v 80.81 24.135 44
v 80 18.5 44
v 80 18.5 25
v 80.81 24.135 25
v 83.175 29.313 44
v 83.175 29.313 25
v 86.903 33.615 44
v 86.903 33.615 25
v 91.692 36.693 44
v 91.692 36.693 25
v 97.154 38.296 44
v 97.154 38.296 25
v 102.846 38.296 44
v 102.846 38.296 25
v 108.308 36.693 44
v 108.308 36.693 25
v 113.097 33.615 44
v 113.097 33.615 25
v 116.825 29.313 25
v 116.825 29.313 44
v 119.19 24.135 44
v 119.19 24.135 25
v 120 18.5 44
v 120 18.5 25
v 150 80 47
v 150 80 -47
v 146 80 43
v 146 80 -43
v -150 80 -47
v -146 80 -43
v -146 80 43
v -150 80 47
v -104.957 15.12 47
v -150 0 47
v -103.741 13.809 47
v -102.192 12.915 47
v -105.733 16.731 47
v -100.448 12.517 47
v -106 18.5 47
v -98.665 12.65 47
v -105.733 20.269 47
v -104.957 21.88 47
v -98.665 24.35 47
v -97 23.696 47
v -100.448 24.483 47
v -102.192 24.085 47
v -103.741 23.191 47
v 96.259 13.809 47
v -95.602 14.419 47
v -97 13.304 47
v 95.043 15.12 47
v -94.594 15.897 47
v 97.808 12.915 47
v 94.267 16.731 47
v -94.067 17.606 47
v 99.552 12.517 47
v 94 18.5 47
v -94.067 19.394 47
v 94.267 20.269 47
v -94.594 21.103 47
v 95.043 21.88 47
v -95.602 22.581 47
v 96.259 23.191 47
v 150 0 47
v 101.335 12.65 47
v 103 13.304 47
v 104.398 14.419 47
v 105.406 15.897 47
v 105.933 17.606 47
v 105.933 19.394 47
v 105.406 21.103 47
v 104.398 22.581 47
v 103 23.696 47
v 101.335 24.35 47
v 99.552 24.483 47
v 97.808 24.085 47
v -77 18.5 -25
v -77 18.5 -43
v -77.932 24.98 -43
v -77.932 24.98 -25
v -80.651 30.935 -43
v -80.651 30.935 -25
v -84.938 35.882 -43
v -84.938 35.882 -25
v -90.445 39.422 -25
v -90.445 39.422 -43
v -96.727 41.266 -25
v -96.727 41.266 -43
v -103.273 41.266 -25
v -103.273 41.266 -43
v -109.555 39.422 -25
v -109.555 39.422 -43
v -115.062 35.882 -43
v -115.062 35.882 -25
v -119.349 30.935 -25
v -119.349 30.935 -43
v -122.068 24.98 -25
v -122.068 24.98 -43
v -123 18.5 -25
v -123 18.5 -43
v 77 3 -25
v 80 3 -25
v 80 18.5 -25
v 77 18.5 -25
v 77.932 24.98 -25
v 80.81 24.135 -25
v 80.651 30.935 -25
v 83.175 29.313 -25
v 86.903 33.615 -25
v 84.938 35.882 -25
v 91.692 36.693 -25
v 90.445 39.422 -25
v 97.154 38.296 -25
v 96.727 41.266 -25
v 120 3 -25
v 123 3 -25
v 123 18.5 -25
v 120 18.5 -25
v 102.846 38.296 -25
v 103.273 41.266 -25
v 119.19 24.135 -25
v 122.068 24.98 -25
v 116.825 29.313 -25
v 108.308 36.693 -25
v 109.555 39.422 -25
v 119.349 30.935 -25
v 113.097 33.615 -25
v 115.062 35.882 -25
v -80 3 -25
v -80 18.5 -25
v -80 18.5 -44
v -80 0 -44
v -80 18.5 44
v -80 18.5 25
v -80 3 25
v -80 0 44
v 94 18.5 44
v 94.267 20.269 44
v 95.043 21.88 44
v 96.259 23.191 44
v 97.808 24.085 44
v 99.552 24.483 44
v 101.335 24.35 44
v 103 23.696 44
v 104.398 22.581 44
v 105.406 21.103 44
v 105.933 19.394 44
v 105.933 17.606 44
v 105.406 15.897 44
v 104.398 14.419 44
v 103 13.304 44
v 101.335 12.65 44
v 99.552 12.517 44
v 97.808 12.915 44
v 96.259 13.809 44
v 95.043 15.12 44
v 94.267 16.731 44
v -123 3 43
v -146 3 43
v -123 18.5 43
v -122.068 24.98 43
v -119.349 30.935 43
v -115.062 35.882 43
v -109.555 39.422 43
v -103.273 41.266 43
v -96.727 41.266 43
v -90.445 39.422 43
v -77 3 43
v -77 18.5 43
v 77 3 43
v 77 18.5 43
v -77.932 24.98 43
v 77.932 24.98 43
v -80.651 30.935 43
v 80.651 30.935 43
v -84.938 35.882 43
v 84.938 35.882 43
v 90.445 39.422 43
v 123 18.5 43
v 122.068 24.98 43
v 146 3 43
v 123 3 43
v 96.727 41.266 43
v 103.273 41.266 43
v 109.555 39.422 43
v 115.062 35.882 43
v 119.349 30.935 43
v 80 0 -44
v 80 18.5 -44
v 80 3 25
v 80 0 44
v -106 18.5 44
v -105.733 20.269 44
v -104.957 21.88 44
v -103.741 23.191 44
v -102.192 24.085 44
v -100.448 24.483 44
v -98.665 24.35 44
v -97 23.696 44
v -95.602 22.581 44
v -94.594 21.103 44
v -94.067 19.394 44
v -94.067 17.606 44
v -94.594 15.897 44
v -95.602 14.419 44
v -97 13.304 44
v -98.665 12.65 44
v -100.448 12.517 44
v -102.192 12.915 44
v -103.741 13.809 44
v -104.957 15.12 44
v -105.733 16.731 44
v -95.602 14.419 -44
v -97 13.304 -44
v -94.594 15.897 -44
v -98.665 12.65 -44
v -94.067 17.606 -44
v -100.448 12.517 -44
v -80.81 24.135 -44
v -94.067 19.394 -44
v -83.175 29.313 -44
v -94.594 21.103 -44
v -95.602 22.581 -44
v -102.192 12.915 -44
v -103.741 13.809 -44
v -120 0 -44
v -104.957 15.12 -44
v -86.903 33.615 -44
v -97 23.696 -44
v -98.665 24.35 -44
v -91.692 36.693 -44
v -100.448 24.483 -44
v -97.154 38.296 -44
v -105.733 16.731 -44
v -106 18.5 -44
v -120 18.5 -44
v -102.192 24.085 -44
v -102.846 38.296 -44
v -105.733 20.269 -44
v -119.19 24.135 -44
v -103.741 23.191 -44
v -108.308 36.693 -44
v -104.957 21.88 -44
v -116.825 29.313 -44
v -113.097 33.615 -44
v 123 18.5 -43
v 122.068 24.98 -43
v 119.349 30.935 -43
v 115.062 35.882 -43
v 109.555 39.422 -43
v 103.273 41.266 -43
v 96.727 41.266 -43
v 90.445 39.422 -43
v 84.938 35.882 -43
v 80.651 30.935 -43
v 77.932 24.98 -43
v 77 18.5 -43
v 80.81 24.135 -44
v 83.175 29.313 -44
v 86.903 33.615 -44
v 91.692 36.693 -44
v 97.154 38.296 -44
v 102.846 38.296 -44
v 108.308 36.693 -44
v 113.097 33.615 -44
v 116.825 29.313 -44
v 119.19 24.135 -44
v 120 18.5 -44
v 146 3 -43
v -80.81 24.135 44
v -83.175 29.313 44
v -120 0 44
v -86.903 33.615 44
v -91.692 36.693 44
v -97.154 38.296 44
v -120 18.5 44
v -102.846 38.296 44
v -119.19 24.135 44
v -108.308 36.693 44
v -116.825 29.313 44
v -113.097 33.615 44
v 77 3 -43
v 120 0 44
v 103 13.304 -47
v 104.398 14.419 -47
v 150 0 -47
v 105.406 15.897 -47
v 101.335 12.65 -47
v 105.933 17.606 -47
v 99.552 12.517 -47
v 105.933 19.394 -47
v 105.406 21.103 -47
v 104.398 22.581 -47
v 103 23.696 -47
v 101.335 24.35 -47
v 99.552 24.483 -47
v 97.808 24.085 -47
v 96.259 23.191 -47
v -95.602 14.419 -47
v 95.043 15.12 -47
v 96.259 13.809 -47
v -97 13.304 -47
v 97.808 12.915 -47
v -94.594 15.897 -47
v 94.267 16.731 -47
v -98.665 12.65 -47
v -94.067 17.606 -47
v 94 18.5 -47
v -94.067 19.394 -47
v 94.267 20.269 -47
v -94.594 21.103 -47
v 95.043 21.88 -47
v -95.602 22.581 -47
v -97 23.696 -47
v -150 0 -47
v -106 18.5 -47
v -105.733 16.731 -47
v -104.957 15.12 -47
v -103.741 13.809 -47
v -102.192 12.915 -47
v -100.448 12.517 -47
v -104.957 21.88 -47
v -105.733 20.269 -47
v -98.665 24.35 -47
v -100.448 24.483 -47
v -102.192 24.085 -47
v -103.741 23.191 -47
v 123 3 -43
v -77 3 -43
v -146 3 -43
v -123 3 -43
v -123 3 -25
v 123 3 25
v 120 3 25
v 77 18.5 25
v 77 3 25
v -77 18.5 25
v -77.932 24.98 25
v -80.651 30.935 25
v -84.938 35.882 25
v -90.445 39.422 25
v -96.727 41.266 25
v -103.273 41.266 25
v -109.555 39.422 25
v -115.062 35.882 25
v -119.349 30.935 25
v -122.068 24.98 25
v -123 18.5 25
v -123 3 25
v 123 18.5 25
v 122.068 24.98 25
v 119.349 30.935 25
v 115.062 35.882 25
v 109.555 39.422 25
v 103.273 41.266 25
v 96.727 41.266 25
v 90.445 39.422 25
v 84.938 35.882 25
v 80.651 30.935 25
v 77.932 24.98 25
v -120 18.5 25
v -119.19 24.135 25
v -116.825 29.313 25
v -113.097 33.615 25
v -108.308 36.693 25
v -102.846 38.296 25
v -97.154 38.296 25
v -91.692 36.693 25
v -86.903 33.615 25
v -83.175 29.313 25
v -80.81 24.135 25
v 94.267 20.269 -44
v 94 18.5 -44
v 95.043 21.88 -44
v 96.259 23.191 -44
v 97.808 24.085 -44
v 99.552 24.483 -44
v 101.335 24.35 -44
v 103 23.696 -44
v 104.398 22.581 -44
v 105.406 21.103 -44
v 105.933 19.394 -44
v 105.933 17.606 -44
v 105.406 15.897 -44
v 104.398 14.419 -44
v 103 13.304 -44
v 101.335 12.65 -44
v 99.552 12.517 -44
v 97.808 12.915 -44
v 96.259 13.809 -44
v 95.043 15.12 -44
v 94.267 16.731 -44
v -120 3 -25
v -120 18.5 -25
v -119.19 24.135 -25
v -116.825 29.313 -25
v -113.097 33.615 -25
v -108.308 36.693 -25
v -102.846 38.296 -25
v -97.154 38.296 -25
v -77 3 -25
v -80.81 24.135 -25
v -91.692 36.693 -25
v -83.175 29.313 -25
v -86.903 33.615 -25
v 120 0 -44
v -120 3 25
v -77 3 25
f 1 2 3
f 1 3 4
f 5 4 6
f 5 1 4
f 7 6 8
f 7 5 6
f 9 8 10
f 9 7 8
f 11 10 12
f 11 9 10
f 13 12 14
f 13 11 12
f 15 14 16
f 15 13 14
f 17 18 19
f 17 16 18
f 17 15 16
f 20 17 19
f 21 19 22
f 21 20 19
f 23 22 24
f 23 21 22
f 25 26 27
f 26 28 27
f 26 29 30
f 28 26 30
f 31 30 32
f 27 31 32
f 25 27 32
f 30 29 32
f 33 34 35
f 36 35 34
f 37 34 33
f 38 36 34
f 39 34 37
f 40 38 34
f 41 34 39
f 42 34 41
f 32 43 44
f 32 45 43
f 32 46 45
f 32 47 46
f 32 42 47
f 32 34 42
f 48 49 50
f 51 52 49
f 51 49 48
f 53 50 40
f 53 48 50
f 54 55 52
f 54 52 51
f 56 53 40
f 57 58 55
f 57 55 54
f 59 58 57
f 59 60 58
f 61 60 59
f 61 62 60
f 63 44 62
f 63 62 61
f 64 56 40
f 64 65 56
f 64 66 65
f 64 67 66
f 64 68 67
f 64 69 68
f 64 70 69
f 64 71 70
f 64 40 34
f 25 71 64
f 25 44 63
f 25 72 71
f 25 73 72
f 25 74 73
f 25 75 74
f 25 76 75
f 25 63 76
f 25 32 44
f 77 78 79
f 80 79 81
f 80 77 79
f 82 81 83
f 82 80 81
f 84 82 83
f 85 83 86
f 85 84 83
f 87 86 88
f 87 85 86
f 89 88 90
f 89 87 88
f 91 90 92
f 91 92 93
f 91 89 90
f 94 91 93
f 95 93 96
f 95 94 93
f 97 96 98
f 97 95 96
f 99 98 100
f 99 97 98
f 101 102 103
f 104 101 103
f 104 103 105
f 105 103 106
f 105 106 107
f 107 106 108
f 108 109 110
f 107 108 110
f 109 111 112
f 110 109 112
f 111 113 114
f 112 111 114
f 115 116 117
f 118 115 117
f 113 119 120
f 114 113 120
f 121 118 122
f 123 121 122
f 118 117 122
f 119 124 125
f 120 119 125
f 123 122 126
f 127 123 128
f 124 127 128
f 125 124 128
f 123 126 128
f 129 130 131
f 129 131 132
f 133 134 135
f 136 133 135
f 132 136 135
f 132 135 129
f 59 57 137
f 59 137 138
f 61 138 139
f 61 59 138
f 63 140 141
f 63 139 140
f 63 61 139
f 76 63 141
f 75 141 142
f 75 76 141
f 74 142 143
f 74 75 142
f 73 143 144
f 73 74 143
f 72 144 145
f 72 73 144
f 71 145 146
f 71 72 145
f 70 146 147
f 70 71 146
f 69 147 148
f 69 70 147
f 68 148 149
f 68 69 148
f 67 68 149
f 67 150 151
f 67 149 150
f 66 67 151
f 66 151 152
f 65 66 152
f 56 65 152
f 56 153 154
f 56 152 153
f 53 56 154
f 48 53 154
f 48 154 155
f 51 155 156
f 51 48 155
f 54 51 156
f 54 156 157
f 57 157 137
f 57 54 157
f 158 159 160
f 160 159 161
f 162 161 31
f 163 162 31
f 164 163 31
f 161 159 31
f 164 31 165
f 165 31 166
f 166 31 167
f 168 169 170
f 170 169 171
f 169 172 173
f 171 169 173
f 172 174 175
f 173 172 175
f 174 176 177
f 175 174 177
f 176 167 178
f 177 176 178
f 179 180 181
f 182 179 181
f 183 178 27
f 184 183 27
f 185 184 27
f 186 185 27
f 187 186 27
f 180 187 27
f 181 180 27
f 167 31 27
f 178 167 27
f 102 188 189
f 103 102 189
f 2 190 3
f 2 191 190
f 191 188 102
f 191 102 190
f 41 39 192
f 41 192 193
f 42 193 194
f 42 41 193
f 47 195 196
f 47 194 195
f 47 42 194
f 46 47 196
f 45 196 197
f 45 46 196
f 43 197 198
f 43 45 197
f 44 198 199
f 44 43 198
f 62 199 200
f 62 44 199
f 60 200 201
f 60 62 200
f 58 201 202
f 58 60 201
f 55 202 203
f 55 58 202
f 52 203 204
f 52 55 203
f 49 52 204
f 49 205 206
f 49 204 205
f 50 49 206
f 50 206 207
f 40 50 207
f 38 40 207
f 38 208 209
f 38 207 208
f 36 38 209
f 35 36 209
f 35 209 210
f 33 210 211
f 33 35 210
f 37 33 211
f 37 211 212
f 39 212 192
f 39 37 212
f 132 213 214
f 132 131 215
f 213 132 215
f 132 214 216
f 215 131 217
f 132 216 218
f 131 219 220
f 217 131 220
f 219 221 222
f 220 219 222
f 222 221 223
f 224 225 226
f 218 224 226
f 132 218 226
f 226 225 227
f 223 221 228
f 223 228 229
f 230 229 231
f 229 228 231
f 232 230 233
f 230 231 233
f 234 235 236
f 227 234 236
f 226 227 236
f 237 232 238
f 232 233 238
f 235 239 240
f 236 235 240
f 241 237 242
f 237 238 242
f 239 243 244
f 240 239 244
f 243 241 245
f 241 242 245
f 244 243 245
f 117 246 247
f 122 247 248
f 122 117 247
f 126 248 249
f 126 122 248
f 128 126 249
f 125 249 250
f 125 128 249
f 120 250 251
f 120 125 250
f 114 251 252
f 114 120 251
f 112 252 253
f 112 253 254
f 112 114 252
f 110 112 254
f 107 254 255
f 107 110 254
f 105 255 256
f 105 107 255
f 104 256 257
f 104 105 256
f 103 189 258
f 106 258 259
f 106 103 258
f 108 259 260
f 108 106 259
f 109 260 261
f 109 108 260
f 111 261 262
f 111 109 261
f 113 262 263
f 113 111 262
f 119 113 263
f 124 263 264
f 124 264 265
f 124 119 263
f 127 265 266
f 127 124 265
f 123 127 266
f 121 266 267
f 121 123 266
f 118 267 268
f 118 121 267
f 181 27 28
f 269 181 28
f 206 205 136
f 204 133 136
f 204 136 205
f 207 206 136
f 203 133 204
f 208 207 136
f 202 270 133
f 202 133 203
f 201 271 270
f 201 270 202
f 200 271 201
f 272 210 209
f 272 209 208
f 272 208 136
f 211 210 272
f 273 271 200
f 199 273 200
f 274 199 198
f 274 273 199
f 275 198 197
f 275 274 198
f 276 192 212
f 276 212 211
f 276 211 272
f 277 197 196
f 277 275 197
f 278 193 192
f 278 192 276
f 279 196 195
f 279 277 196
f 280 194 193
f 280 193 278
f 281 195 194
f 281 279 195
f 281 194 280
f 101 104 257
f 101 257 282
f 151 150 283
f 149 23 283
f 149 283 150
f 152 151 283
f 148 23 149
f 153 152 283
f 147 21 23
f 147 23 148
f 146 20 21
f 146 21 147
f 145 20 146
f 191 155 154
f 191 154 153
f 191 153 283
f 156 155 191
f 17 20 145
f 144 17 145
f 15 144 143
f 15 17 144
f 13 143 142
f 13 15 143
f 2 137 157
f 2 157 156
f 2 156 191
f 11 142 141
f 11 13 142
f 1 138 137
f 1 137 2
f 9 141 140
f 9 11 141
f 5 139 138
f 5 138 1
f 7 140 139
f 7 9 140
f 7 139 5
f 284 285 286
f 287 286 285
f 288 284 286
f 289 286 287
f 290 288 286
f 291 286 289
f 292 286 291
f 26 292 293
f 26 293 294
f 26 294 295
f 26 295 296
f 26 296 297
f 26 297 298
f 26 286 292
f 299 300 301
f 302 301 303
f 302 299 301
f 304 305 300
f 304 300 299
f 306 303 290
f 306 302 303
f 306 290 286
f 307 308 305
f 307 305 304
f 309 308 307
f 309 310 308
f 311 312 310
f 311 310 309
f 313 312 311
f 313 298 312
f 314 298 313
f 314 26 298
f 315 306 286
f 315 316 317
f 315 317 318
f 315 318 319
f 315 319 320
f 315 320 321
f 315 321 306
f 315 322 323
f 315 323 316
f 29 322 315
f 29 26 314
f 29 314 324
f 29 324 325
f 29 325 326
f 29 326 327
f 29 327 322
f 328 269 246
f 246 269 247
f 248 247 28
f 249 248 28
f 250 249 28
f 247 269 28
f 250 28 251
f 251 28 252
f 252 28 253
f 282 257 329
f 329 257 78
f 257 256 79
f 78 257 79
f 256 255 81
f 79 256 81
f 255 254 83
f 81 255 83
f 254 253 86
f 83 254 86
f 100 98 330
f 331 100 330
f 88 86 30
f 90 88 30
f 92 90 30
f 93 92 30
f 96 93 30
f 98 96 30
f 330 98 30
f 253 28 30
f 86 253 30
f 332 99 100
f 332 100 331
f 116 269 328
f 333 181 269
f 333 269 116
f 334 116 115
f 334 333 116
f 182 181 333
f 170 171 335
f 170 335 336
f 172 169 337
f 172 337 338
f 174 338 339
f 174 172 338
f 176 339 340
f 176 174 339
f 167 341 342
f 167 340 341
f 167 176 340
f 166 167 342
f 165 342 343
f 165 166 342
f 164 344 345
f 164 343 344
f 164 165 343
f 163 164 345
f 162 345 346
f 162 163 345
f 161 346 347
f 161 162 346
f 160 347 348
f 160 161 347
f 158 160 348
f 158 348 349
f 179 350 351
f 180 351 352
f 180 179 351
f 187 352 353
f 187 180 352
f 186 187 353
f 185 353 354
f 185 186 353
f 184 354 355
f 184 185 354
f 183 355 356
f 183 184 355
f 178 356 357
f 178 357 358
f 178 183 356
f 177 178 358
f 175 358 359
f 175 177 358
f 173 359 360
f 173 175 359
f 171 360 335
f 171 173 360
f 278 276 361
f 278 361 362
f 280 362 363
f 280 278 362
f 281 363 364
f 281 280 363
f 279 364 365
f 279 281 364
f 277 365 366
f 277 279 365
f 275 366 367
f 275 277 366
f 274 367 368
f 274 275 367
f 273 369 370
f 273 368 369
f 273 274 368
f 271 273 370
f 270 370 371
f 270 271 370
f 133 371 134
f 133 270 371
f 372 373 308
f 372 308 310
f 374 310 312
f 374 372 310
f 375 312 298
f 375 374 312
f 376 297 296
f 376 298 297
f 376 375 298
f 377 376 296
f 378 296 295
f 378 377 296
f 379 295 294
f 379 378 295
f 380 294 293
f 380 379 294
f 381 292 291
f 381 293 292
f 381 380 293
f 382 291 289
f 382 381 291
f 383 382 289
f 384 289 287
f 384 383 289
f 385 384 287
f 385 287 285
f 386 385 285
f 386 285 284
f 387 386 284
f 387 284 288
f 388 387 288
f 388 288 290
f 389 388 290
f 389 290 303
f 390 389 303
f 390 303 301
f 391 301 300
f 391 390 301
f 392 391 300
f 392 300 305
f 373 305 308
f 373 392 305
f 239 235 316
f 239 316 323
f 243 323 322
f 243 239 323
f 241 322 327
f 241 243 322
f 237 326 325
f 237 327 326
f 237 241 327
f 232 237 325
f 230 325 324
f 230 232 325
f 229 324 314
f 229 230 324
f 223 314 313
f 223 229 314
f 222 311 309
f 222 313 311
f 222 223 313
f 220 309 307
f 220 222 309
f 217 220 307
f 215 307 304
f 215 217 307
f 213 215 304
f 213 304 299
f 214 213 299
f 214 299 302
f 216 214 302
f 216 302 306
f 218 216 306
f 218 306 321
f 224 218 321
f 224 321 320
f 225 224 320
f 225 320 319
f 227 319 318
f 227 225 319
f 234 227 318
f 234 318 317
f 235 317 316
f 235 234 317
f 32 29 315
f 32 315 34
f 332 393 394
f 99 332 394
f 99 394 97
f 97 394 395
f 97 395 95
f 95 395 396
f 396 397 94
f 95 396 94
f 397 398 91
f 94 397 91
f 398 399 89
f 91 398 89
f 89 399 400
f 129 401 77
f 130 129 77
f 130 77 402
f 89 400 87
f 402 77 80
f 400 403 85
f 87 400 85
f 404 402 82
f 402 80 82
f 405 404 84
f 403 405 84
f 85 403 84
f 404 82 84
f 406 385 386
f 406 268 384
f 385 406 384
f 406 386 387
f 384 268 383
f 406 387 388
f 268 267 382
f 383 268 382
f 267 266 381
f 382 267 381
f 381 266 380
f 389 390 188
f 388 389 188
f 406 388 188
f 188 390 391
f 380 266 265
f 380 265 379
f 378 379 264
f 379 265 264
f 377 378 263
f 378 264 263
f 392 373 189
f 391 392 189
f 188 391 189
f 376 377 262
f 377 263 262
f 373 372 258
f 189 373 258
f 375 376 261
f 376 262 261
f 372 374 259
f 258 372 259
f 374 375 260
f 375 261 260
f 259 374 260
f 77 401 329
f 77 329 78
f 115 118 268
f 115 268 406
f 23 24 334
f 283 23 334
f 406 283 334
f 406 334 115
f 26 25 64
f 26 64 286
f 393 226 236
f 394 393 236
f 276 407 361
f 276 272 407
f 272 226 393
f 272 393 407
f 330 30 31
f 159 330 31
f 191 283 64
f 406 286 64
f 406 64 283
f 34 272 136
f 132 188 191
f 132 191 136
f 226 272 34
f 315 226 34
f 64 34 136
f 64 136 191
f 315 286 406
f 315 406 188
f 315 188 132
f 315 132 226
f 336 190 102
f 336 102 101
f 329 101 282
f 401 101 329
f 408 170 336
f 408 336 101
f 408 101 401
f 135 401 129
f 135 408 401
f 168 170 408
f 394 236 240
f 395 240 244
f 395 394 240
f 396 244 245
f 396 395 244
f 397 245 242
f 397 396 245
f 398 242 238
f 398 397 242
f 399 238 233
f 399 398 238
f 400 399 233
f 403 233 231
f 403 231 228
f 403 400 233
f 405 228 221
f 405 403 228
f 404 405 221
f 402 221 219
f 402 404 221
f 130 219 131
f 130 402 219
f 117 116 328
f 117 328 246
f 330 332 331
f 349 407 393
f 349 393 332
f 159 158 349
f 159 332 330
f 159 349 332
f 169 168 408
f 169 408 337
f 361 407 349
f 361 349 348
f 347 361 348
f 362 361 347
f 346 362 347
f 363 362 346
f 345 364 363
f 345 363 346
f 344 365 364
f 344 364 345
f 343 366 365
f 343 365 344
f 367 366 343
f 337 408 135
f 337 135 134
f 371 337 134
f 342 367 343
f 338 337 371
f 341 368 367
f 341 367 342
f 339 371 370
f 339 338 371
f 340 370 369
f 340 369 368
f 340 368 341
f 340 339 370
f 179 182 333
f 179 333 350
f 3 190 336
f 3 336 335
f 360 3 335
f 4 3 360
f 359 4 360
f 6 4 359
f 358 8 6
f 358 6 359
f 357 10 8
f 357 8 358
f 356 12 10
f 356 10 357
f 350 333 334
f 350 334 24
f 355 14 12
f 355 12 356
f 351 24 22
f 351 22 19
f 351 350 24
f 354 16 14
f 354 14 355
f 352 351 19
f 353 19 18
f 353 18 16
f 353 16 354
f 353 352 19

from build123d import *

# Parameters (mm, degrees)
SALIENTE_EXTRUIR1_DEPTH    = 47
CROQUIS2_W                 = 50
CROQUIS2_H                 = 38.5
CORTAR_EXTRUIR1_DEPTH      = 281.107568623
SALIENTE_EXTRUIR2_DEPTH    = 3
SALIENTE_EXTRUIR3_DEPTH    = 4
SALIENTE_EXTRUIR4_START    = -4
SALIENTE_EXTRUIR4_DEPTH    = 4
CROQUIS6_W                 = 86
CROQUIS6_H                 = 77
SALIENTE_EXTRUIR5_DEPTH    = 4
CROQUIS7_W                 = 86
CROQUIS7_H                 = 77
SALIENTE_EXTRUIR6_DEPTH    = 4
CORTAR_EXTRUIR2_DEPTH      = 193.353840617
CORTAR_EXTRUIR2_DEPTH_BACK = 193.353840617
CROQUIS9_R                 = 6


with BuildPart() as part:
    # Croquis1 → Saliente-Extruir1 (new, symmetric)
    with BuildSketch(Plane.XY):
        with BuildLine():
            Line((-150, 0), (-120, 0))
            Line((-120, 0), (-120, 18.5))
            ThreePointArc((-120, 18.5), (-100, 38.5), (-80, 18.5))
            Line((-80, 18.5), (-80, 0))
            Line((-80, 0), (80, 0))
            Line((80, 0), (80, 18.5))
            ThreePointArc((80, 18.5), (100, 38.5), (120, 18.5))
            Line((120, 18.5), (120, 0))
            Line((120, 0), (150, 0))
            Line((150, 0), (150, 3))
            Line((150, 3), (123, 3))
            Line((123, 3), (123, 18.5))
            ThreePointArc((123, 18.5), (100, 41.5), (77, 18.5))
            Line((77, 18.5), (77, 3))
            Line((77, 3), (-77, 3))
            Line((-77, 3), (-77, 18.5))
            ThreePointArc((-77, 18.5), (-100, 41.5), (-123, 18.5))
            Line((-123, 18.5), (-123, 3))
            Line((-123, 3), (-150, 3))
            Line((-150, 3), (-150, 0))
        make_face()
    extrude(amount=SALIENTE_EXTRUIR1_DEPTH, both=True)

    # Croquis2 → Cortar-Extruir1 (cut, through all)
    with BuildSketch(Plane(origin=(123, 0, 0), x_dir=(0, 0, -1), z_dir=(1, 0, 0))):
        with Locations((0, 22.25)):
            Rectangle(CROQUIS2_W, CROQUIS2_H)
    extrude(amount=-CORTAR_EXTRUIR1_DEPTH, mode=Mode.SUBTRACT)

    # Croquis3 → Saliente-Extruir2 (add)
    with BuildSketch(Plane.XY.offset(47)):
        with BuildLine():
            Line((120, 18.5), (120, 0))
            Line((120, 0), (80, 0))
            Line((80, 0), (80, 18.5))
            ThreePointArc((80, 18.5), (100, 38.5), (120, 18.5))
        make_face()
        with BuildLine():
            Line((-120, 0), (-120, 18.5))
            ThreePointArc((-120, 18.5), (-100, 38.5), (-80, 18.5))
            Line((-80, 18.5), (-80, 0))
            Line((-80, 0), (-120, 0))
        make_face()
    saliente_extruir2 = extrude(amount=-SALIENTE_EXTRUIR2_DEPTH)

    # Simetría1: Saliente-Extruir2 across plane
    add(saliente_extruir2.mirror(Plane.XY))

    # Croquis4 → Saliente-Extruir3 (add)
    with BuildSketch(Plane.XY.offset(47)):
        with BuildLine():
            Line((150, 80), (-150, 80))
            Line((-150, 80), (-150, 3))
            Line((-150, 3), (-123, 3))
            Line((-123, 3), (-123, 18.5))
            ThreePointArc((-123, 18.5), (-100, 41.5), (-77, 18.5))
            Line((-77, 18.5), (-77, 3))
            Line((-77, 3), (77, 3))
            Line((77, 3), (77, 18.5))
            ThreePointArc((77, 18.5), (100, 41.5), (123, 18.5))
            Line((123, 18.5), (123, 3))
            Line((123, 3), (150, 3))
            Line((150, 3), (150, 80))
        make_face()
    extrude(amount=-SALIENTE_EXTRUIR3_DEPTH)

    # Croquis5 → Saliente-Extruir4 (add)
    with BuildSketch(Plane(origin=(0, 0, -47), x_dir=(-1, 0, 0), z_dir=(0, 0, -1)).offset(SALIENTE_EXTRUIR4_START)):
        with BuildLine():
            Line((123, 3), (150, 3))
            Line((150, 3), (150, 80))
            Line((150, 80), (-150, 80))
            Line((-150, 80), (-150, 3))
            Line((-150, 3), (-123, 3))
            Line((-123, 3), (-123, 18.5))
            ThreePointArc((-123, 18.5), (-100, 41.5), (-77, 18.5))
            Line((-77, 18.5), (-77, 3))
            Line((-77, 3), (77, 3))
            Line((77, 3), (77, 18.5))
            ThreePointArc((77, 18.5), (100, 41.5), (123, 18.5))
            Line((123, 18.5), (123, 3))
        make_face()
    extrude(amount=SALIENTE_EXTRUIR4_DEPTH)

    # Croquis6 → Saliente-Extruir5 (add)
    with BuildSketch(Plane(origin=(150, 0, 0), x_dir=(0, 0, -1), z_dir=(1, 0, 0))):
        with Locations((0, 41.5)):
            Rectangle(CROQUIS6_W, CROQUIS6_H)
    extrude(amount=-SALIENTE_EXTRUIR5_DEPTH)

    # Croquis7 → Saliente-Extruir6 (add)
    with BuildSketch(Plane.ZY.offset(150)):
        with Locations((0, 41.5)):
            Rectangle(CROQUIS7_W, CROQUIS7_H)
    extrude(amount=-SALIENTE_EXTRUIR6_DEPTH)

    # Croquis9 → Cortar-Extruir2 (cut, two sides: drawn at the far end of the back side and taken through both)
    with BuildSketch(Plane(origin=(0, 0, 43), x_dir=(-1, 0, 0), z_dir=(0, 0, -1)).offset(-CORTAR_EXTRUIR2_DEPTH_BACK)):
        with Locations((100, 18.5)):
            Circle(CROQUIS9_R)
        with Locations((-100, 18.5)):
            Circle(CROQUIS9_R)
    extrude(amount=CORTAR_EXTRUIR2_DEPTH + CORTAR_EXTRUIR2_DEPTH_BACK, mode=Mode.SUBTRACT)


solid = part.part
